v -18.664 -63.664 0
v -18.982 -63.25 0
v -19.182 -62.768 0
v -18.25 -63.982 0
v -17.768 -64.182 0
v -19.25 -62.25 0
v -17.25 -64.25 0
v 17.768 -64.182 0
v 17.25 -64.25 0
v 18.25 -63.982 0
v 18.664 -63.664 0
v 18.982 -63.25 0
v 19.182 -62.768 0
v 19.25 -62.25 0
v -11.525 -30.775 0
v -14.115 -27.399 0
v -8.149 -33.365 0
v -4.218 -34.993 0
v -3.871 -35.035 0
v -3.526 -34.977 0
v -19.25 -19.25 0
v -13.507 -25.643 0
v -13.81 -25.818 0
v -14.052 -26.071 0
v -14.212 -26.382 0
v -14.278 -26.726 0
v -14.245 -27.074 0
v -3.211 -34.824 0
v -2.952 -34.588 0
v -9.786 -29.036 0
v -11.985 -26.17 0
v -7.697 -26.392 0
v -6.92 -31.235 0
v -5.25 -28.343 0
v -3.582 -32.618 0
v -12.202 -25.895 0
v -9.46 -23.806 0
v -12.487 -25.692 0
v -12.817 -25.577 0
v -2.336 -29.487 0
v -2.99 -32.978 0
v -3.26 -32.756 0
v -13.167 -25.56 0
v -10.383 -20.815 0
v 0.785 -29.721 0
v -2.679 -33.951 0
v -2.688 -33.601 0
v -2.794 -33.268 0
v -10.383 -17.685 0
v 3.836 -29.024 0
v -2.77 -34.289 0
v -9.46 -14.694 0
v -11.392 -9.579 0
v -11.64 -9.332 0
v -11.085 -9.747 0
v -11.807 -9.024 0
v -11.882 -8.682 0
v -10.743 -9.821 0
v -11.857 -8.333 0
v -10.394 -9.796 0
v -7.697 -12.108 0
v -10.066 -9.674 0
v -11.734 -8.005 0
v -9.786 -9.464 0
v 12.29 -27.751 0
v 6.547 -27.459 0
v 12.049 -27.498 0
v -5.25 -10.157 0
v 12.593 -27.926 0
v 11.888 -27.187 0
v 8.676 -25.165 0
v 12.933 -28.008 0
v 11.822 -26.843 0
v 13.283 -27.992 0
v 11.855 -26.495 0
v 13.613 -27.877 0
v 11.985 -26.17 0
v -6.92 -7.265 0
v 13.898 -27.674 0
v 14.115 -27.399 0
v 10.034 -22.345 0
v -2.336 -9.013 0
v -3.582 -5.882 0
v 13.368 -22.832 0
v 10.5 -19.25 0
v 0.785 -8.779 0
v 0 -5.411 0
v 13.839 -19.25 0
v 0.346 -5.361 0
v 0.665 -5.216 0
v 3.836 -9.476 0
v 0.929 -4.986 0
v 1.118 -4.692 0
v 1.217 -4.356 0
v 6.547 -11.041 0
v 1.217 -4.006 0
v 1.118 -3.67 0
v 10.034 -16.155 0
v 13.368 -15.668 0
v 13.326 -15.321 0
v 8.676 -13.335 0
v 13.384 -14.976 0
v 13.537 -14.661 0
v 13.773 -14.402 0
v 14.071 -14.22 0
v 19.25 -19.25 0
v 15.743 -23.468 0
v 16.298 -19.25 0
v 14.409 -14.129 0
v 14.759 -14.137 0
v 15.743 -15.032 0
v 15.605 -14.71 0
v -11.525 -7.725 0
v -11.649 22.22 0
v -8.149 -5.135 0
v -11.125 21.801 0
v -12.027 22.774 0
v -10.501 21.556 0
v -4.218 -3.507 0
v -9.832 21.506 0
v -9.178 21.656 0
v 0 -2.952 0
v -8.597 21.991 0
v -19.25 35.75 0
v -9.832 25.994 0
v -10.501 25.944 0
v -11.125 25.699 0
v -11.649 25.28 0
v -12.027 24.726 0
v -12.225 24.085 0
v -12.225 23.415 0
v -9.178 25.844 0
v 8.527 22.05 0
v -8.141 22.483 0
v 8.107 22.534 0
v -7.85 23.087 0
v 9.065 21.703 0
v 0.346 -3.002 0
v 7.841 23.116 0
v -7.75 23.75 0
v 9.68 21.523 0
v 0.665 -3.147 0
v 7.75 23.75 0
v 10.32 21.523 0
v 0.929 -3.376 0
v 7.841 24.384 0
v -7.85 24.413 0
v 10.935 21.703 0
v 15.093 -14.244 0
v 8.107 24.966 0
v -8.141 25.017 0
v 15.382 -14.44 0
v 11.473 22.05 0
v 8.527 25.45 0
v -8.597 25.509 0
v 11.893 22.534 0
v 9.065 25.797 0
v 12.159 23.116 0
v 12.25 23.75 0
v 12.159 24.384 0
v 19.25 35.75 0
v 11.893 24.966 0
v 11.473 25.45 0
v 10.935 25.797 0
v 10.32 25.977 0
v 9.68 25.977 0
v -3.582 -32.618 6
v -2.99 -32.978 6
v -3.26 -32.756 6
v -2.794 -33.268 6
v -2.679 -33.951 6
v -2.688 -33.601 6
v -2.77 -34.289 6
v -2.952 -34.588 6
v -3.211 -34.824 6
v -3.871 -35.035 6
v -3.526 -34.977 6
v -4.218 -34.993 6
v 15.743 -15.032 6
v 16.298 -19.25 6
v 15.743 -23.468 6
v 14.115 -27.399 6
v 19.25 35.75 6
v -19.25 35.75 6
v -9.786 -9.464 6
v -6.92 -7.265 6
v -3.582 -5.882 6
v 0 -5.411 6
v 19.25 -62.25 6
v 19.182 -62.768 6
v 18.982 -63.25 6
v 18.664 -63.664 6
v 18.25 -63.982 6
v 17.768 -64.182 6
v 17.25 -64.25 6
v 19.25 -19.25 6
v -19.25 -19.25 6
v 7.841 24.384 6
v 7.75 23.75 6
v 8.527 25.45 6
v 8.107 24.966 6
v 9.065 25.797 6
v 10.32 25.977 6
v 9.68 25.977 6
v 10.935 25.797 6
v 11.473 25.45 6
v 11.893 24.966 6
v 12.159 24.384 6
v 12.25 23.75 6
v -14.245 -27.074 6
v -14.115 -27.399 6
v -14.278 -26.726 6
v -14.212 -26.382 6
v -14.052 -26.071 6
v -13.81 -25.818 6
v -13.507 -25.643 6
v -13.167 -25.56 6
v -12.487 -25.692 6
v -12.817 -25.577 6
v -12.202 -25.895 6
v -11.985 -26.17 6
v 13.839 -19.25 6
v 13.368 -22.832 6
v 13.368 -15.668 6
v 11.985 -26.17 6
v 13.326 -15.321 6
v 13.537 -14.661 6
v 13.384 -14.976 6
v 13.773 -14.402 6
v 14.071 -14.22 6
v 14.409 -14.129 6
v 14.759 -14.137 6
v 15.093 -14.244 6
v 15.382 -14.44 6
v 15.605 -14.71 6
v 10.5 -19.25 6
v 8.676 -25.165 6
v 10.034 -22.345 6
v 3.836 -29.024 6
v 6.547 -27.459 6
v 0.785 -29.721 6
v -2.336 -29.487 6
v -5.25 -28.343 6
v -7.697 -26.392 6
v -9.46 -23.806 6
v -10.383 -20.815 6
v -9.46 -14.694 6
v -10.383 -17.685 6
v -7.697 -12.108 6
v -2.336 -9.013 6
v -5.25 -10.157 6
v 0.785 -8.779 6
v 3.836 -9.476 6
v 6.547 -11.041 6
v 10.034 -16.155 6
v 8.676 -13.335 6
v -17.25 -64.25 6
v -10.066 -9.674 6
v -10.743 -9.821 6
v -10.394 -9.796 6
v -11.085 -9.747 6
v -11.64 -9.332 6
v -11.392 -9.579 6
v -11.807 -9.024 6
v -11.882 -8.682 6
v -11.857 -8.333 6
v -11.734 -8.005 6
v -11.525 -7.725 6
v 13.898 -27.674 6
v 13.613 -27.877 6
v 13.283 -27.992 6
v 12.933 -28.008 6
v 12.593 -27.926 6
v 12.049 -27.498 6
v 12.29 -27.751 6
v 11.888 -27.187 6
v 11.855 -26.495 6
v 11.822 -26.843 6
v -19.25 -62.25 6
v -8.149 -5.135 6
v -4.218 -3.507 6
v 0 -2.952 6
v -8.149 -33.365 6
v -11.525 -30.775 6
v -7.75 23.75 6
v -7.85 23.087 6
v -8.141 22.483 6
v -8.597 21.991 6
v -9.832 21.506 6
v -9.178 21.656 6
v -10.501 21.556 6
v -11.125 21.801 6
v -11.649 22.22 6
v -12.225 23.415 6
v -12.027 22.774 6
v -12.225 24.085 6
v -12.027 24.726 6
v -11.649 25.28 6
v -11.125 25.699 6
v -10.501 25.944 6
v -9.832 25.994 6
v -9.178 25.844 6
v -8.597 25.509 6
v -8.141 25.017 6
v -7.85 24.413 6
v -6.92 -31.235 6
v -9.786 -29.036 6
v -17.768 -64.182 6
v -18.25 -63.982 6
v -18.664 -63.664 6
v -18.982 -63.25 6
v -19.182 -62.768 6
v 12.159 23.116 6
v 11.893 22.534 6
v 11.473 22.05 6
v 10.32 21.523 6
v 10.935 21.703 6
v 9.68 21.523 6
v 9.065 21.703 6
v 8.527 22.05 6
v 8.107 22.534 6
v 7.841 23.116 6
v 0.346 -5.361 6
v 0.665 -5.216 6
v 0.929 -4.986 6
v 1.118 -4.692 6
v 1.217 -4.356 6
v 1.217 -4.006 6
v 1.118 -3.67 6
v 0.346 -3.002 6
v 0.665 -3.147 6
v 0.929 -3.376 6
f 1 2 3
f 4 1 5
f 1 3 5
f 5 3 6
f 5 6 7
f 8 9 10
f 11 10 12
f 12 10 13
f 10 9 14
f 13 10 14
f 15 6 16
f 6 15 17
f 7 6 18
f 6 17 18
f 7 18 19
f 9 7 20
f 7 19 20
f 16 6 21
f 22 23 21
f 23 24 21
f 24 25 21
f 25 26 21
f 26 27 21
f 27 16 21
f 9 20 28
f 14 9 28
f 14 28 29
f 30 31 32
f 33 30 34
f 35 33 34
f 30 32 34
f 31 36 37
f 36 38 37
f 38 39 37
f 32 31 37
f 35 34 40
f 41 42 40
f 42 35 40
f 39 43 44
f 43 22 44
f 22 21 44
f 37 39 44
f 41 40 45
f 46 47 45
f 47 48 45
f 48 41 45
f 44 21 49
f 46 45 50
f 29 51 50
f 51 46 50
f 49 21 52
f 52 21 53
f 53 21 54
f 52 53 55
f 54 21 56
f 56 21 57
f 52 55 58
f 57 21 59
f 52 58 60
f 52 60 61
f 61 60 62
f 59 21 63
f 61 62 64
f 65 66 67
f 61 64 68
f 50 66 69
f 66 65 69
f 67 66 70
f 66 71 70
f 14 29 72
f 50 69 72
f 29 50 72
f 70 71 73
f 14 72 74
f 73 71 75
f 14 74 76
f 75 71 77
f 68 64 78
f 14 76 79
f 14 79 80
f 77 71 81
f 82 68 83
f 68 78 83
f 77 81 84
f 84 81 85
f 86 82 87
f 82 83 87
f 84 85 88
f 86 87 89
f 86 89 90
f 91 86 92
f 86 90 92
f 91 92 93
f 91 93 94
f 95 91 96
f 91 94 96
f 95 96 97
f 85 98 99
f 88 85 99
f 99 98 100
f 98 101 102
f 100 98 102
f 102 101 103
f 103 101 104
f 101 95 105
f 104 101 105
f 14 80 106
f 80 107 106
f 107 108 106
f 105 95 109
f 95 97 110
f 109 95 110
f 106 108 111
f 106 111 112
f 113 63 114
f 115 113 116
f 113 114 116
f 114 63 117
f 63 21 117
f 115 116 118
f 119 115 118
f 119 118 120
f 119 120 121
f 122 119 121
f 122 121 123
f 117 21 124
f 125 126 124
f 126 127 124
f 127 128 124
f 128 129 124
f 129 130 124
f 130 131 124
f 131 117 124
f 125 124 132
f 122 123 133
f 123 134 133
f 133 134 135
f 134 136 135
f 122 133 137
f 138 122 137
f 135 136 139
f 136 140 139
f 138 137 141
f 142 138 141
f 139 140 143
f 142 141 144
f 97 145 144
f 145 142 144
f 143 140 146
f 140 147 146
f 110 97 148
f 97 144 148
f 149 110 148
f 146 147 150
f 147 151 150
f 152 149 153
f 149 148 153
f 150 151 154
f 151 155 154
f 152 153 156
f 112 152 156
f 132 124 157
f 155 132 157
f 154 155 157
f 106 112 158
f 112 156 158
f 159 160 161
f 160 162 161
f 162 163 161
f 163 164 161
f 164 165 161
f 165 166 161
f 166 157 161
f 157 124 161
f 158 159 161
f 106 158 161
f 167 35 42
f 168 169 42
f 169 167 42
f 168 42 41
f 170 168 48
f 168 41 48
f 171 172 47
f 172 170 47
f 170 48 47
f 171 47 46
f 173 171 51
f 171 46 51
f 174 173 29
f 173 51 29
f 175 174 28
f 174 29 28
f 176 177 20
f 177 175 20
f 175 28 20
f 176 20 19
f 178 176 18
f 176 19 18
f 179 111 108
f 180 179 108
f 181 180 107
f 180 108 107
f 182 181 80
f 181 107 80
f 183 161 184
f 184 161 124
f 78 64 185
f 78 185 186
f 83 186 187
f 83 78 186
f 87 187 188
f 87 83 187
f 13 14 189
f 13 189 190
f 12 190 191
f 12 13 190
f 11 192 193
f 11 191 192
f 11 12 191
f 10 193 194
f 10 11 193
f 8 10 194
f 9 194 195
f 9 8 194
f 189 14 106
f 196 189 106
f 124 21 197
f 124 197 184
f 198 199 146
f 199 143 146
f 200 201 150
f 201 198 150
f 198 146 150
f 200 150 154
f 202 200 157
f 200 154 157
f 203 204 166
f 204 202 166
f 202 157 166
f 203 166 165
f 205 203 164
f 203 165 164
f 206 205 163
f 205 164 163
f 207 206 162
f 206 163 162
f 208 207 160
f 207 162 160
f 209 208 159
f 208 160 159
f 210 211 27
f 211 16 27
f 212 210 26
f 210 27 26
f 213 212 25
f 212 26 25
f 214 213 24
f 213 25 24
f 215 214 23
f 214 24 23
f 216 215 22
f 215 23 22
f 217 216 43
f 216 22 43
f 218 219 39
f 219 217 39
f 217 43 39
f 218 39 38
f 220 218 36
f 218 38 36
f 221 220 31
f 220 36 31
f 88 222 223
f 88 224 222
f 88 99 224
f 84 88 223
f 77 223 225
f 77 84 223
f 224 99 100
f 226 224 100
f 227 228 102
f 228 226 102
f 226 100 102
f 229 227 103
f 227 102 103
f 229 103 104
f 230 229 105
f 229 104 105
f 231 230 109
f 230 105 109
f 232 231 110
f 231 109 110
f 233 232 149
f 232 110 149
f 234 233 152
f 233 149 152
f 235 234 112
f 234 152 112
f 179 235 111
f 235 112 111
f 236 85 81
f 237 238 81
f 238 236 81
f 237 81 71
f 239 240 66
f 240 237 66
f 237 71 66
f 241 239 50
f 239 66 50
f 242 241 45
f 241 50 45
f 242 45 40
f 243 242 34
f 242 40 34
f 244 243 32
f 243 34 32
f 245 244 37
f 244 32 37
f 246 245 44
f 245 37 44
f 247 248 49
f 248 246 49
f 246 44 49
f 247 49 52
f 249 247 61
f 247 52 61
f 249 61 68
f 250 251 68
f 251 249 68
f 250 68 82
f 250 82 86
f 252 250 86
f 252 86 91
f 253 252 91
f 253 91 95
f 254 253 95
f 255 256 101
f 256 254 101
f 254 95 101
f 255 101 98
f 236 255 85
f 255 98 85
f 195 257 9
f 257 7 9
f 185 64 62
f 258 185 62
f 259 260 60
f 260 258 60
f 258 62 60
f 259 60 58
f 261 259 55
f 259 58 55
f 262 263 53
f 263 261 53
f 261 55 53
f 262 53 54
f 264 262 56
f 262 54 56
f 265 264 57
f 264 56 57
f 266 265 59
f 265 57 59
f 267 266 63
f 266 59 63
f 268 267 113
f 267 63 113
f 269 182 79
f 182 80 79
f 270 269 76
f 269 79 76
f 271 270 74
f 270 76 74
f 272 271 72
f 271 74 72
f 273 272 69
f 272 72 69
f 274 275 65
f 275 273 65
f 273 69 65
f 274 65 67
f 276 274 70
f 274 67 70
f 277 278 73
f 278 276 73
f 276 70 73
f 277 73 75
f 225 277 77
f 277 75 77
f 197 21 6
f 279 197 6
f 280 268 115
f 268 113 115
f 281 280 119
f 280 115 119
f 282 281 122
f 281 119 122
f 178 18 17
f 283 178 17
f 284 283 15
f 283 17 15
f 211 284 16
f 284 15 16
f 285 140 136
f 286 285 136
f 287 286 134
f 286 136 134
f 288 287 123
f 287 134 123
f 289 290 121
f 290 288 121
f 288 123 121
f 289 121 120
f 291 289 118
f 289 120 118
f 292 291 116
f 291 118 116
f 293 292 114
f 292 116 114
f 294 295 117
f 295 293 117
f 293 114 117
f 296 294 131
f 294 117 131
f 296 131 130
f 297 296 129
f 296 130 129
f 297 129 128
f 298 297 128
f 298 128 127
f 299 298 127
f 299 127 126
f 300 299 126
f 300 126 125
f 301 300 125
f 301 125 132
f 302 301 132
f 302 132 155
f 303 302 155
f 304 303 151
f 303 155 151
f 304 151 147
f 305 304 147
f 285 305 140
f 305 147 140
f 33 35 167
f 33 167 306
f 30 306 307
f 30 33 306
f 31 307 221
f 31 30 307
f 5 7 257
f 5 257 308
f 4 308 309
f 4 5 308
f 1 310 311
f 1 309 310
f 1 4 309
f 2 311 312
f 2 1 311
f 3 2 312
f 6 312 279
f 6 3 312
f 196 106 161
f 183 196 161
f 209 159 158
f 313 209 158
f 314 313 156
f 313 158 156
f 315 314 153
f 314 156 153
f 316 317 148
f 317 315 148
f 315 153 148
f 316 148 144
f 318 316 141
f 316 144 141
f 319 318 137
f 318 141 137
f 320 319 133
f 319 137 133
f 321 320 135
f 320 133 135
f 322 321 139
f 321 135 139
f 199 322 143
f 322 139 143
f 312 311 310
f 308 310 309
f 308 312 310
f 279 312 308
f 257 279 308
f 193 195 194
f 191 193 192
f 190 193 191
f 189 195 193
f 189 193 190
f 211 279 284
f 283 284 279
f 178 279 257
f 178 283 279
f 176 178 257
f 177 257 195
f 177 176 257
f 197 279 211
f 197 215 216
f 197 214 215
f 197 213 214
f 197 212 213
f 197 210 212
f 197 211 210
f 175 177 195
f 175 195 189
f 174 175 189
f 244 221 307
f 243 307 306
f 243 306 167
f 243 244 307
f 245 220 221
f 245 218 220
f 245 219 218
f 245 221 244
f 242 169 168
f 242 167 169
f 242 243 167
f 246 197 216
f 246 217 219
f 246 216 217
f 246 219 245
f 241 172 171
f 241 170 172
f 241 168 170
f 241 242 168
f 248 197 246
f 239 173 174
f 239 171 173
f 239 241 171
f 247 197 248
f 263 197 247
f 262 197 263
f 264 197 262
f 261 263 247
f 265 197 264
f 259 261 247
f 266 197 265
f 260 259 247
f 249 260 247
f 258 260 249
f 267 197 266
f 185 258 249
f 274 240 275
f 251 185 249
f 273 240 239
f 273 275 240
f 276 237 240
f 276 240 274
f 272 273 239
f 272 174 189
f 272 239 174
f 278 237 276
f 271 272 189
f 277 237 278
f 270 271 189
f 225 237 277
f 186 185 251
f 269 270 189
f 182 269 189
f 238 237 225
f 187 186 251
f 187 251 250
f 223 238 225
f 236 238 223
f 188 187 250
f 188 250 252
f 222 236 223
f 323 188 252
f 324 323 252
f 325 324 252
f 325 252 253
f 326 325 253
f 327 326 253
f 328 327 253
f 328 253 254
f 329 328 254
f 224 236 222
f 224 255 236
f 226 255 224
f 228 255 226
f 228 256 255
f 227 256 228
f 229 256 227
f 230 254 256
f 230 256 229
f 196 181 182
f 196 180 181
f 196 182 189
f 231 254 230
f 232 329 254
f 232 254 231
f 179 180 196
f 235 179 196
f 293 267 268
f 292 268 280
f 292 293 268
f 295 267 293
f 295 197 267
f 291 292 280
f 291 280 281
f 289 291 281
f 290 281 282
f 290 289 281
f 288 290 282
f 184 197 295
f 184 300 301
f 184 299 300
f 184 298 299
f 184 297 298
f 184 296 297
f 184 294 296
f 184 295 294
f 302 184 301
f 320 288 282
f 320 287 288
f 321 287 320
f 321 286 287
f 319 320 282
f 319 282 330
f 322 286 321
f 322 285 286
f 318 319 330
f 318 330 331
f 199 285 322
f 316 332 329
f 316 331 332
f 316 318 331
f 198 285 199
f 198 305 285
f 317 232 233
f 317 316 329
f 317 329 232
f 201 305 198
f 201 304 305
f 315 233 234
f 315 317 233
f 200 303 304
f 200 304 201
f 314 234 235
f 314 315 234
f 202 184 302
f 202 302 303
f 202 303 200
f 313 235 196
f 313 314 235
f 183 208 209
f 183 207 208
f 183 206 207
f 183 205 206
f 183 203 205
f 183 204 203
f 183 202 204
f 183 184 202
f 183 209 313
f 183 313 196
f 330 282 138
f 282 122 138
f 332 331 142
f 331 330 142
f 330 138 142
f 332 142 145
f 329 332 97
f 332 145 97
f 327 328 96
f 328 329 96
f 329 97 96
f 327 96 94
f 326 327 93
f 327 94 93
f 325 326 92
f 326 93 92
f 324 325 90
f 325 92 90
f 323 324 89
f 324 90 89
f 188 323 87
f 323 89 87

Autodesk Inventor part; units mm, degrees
ref_plane "YZ Plane" through (0, 0, 0) normal (1, 0, 0) x (0, 1, 0)
ref_plane "XZ Plane" through (0, 0, 0) normal (0, 1, 0) x (-1, 0, 0)
ref_plane "XY Plane" through (0, 0, 0) normal (0, 0, 1) x (1, 0, 0)
sketch "Sketch1" plane through (0, 0, 0) normal (0, 0, 1) x (1, 0, 0)
  circle A0 centre (0, -19.25) radius 10.5
  arc A1 (11.9852, -26.1697) -> (14.1148, -27.3992) centre (13.05, -26.7844) ccw
  arc A2 (-11.9852, -26.1697) -> (-14.1148, -27.3992) centre (-13.05, -26.7844) ccw
  arc A3 (0, -5.4107) -> (0, -2.9517) centre (0, -4.1812) ccw
  line L0 (0, -19.25) -> (14.5554, -15.3499) construction
  line L1 (0, -19.25) -> (13.05, -26.7844) construction
  line L2 (0, -19.25) -> (-10.6553, -8.5947) construction
  line L3 (0, -19.25) -> (0, -4.1812) construction
  line L4 (0, -19.25) -> (-3.9001, -33.8054) construction
  line L5 (0, -19.25) -> (-13.05, -26.7844) construction
  arc A4 (-4.2183, -34.993) -> (-3.5819, -32.6178) centre (-3.9001, -33.8054) ccw
  arc A5 (15.743, -15.0317) -> (13.3678, -15.6681) centre (14.5554, -15.3499) ccw
  arc A6 (-11.5247, -7.7253) -> (-9.7859, -9.4641) centre (-10.6553, -8.5947) ccw
  arc A7 (0, -2.9517) -> (-11.5247, -7.7253) centre (0, -19.25) ccw
  arc A8 (0, -5.4107) -> (-9.7859, -9.4641) centre (0, -19.25) ccw
  arc A9 (11.9852, -26.1697) -> (13.3678, -15.6681) centre (0, -19.25) ccw
  arc A10 (14.1148, -27.3992) -> (15.743, -15.0317) centre (0, -19.25) ccw
  arc A11 (-11.9852, -26.1697) -> (-3.5819, -32.6178) centre (0, -19.25) ccw
  arc A12 (-14.1148, -27.3992) -> (-4.2183, -34.993) centre (0, -19.25) ccw
  line L6 (19.25, -19.25) -> (19.25, 35.75)
  line L7 (-19.25, -19.25) -> (-19.25, 35.75)
  line L8 (19.25, 35.75) -> (-19.25, 35.75)
  circle A13 centre (-10, 23.75) radius 2.25
  circle A14 centre (10, 23.75) radius 2.25
  line L9 (10, 23.75) -> (-10, 23.75)
  line L10 (-19.25, -19.25) -> (-19.25, -62.25)
  line L11 (-17.25, -64.25) -> (17.25, -64.25)
  line L12 (19.25, -62.25) -> (19.25, -19.25)
  arc A15 (-19.25, -62.25) -> (-17.25, -64.25) centre (-17.25, -62.25) ccw
  arc A16 (17.25, -64.25) -> (19.25, -62.25) centre (17.25, -62.25) ccw
  point P0 (0, 0)
  point P1 (19.25, 30.75)
  point P2 (-19.25, -64.25)
  dimension "d0" = 21
  dimension "d1" = 45
  dimension "d2" = 45
  dimension "d3" = 45
  dimension "d4" = 2.459
  dimension "d5" = 2.459
  dimension "d6" = 2.459
  dimension "d7" = 2.459
  dimension "d8" = 2.459
  dimension "d9" = 2.459
  dimension "d11" = 55
  dimension "d21" = 4.5
  dimension "d22" = 12
  dimension "d23" = 4.5
  dimension "d24" = 20
  dimension "d25" = 9.25
  dimension "d26" = 38.5
  dimension "d27" = 45
  dimension "d28" = 2
extrude "Extrusion1" add sketch "Sketch1" along normal blind 6
equation "\"d8\" = d6"
equation "\"d9\" = d7"
equation "\"d23\" = d21"
equation "\"d25\" = -0.5 * d24 + 0.5 * d26"
properties part number "BaseC_7" material "PMMA Plastic"
